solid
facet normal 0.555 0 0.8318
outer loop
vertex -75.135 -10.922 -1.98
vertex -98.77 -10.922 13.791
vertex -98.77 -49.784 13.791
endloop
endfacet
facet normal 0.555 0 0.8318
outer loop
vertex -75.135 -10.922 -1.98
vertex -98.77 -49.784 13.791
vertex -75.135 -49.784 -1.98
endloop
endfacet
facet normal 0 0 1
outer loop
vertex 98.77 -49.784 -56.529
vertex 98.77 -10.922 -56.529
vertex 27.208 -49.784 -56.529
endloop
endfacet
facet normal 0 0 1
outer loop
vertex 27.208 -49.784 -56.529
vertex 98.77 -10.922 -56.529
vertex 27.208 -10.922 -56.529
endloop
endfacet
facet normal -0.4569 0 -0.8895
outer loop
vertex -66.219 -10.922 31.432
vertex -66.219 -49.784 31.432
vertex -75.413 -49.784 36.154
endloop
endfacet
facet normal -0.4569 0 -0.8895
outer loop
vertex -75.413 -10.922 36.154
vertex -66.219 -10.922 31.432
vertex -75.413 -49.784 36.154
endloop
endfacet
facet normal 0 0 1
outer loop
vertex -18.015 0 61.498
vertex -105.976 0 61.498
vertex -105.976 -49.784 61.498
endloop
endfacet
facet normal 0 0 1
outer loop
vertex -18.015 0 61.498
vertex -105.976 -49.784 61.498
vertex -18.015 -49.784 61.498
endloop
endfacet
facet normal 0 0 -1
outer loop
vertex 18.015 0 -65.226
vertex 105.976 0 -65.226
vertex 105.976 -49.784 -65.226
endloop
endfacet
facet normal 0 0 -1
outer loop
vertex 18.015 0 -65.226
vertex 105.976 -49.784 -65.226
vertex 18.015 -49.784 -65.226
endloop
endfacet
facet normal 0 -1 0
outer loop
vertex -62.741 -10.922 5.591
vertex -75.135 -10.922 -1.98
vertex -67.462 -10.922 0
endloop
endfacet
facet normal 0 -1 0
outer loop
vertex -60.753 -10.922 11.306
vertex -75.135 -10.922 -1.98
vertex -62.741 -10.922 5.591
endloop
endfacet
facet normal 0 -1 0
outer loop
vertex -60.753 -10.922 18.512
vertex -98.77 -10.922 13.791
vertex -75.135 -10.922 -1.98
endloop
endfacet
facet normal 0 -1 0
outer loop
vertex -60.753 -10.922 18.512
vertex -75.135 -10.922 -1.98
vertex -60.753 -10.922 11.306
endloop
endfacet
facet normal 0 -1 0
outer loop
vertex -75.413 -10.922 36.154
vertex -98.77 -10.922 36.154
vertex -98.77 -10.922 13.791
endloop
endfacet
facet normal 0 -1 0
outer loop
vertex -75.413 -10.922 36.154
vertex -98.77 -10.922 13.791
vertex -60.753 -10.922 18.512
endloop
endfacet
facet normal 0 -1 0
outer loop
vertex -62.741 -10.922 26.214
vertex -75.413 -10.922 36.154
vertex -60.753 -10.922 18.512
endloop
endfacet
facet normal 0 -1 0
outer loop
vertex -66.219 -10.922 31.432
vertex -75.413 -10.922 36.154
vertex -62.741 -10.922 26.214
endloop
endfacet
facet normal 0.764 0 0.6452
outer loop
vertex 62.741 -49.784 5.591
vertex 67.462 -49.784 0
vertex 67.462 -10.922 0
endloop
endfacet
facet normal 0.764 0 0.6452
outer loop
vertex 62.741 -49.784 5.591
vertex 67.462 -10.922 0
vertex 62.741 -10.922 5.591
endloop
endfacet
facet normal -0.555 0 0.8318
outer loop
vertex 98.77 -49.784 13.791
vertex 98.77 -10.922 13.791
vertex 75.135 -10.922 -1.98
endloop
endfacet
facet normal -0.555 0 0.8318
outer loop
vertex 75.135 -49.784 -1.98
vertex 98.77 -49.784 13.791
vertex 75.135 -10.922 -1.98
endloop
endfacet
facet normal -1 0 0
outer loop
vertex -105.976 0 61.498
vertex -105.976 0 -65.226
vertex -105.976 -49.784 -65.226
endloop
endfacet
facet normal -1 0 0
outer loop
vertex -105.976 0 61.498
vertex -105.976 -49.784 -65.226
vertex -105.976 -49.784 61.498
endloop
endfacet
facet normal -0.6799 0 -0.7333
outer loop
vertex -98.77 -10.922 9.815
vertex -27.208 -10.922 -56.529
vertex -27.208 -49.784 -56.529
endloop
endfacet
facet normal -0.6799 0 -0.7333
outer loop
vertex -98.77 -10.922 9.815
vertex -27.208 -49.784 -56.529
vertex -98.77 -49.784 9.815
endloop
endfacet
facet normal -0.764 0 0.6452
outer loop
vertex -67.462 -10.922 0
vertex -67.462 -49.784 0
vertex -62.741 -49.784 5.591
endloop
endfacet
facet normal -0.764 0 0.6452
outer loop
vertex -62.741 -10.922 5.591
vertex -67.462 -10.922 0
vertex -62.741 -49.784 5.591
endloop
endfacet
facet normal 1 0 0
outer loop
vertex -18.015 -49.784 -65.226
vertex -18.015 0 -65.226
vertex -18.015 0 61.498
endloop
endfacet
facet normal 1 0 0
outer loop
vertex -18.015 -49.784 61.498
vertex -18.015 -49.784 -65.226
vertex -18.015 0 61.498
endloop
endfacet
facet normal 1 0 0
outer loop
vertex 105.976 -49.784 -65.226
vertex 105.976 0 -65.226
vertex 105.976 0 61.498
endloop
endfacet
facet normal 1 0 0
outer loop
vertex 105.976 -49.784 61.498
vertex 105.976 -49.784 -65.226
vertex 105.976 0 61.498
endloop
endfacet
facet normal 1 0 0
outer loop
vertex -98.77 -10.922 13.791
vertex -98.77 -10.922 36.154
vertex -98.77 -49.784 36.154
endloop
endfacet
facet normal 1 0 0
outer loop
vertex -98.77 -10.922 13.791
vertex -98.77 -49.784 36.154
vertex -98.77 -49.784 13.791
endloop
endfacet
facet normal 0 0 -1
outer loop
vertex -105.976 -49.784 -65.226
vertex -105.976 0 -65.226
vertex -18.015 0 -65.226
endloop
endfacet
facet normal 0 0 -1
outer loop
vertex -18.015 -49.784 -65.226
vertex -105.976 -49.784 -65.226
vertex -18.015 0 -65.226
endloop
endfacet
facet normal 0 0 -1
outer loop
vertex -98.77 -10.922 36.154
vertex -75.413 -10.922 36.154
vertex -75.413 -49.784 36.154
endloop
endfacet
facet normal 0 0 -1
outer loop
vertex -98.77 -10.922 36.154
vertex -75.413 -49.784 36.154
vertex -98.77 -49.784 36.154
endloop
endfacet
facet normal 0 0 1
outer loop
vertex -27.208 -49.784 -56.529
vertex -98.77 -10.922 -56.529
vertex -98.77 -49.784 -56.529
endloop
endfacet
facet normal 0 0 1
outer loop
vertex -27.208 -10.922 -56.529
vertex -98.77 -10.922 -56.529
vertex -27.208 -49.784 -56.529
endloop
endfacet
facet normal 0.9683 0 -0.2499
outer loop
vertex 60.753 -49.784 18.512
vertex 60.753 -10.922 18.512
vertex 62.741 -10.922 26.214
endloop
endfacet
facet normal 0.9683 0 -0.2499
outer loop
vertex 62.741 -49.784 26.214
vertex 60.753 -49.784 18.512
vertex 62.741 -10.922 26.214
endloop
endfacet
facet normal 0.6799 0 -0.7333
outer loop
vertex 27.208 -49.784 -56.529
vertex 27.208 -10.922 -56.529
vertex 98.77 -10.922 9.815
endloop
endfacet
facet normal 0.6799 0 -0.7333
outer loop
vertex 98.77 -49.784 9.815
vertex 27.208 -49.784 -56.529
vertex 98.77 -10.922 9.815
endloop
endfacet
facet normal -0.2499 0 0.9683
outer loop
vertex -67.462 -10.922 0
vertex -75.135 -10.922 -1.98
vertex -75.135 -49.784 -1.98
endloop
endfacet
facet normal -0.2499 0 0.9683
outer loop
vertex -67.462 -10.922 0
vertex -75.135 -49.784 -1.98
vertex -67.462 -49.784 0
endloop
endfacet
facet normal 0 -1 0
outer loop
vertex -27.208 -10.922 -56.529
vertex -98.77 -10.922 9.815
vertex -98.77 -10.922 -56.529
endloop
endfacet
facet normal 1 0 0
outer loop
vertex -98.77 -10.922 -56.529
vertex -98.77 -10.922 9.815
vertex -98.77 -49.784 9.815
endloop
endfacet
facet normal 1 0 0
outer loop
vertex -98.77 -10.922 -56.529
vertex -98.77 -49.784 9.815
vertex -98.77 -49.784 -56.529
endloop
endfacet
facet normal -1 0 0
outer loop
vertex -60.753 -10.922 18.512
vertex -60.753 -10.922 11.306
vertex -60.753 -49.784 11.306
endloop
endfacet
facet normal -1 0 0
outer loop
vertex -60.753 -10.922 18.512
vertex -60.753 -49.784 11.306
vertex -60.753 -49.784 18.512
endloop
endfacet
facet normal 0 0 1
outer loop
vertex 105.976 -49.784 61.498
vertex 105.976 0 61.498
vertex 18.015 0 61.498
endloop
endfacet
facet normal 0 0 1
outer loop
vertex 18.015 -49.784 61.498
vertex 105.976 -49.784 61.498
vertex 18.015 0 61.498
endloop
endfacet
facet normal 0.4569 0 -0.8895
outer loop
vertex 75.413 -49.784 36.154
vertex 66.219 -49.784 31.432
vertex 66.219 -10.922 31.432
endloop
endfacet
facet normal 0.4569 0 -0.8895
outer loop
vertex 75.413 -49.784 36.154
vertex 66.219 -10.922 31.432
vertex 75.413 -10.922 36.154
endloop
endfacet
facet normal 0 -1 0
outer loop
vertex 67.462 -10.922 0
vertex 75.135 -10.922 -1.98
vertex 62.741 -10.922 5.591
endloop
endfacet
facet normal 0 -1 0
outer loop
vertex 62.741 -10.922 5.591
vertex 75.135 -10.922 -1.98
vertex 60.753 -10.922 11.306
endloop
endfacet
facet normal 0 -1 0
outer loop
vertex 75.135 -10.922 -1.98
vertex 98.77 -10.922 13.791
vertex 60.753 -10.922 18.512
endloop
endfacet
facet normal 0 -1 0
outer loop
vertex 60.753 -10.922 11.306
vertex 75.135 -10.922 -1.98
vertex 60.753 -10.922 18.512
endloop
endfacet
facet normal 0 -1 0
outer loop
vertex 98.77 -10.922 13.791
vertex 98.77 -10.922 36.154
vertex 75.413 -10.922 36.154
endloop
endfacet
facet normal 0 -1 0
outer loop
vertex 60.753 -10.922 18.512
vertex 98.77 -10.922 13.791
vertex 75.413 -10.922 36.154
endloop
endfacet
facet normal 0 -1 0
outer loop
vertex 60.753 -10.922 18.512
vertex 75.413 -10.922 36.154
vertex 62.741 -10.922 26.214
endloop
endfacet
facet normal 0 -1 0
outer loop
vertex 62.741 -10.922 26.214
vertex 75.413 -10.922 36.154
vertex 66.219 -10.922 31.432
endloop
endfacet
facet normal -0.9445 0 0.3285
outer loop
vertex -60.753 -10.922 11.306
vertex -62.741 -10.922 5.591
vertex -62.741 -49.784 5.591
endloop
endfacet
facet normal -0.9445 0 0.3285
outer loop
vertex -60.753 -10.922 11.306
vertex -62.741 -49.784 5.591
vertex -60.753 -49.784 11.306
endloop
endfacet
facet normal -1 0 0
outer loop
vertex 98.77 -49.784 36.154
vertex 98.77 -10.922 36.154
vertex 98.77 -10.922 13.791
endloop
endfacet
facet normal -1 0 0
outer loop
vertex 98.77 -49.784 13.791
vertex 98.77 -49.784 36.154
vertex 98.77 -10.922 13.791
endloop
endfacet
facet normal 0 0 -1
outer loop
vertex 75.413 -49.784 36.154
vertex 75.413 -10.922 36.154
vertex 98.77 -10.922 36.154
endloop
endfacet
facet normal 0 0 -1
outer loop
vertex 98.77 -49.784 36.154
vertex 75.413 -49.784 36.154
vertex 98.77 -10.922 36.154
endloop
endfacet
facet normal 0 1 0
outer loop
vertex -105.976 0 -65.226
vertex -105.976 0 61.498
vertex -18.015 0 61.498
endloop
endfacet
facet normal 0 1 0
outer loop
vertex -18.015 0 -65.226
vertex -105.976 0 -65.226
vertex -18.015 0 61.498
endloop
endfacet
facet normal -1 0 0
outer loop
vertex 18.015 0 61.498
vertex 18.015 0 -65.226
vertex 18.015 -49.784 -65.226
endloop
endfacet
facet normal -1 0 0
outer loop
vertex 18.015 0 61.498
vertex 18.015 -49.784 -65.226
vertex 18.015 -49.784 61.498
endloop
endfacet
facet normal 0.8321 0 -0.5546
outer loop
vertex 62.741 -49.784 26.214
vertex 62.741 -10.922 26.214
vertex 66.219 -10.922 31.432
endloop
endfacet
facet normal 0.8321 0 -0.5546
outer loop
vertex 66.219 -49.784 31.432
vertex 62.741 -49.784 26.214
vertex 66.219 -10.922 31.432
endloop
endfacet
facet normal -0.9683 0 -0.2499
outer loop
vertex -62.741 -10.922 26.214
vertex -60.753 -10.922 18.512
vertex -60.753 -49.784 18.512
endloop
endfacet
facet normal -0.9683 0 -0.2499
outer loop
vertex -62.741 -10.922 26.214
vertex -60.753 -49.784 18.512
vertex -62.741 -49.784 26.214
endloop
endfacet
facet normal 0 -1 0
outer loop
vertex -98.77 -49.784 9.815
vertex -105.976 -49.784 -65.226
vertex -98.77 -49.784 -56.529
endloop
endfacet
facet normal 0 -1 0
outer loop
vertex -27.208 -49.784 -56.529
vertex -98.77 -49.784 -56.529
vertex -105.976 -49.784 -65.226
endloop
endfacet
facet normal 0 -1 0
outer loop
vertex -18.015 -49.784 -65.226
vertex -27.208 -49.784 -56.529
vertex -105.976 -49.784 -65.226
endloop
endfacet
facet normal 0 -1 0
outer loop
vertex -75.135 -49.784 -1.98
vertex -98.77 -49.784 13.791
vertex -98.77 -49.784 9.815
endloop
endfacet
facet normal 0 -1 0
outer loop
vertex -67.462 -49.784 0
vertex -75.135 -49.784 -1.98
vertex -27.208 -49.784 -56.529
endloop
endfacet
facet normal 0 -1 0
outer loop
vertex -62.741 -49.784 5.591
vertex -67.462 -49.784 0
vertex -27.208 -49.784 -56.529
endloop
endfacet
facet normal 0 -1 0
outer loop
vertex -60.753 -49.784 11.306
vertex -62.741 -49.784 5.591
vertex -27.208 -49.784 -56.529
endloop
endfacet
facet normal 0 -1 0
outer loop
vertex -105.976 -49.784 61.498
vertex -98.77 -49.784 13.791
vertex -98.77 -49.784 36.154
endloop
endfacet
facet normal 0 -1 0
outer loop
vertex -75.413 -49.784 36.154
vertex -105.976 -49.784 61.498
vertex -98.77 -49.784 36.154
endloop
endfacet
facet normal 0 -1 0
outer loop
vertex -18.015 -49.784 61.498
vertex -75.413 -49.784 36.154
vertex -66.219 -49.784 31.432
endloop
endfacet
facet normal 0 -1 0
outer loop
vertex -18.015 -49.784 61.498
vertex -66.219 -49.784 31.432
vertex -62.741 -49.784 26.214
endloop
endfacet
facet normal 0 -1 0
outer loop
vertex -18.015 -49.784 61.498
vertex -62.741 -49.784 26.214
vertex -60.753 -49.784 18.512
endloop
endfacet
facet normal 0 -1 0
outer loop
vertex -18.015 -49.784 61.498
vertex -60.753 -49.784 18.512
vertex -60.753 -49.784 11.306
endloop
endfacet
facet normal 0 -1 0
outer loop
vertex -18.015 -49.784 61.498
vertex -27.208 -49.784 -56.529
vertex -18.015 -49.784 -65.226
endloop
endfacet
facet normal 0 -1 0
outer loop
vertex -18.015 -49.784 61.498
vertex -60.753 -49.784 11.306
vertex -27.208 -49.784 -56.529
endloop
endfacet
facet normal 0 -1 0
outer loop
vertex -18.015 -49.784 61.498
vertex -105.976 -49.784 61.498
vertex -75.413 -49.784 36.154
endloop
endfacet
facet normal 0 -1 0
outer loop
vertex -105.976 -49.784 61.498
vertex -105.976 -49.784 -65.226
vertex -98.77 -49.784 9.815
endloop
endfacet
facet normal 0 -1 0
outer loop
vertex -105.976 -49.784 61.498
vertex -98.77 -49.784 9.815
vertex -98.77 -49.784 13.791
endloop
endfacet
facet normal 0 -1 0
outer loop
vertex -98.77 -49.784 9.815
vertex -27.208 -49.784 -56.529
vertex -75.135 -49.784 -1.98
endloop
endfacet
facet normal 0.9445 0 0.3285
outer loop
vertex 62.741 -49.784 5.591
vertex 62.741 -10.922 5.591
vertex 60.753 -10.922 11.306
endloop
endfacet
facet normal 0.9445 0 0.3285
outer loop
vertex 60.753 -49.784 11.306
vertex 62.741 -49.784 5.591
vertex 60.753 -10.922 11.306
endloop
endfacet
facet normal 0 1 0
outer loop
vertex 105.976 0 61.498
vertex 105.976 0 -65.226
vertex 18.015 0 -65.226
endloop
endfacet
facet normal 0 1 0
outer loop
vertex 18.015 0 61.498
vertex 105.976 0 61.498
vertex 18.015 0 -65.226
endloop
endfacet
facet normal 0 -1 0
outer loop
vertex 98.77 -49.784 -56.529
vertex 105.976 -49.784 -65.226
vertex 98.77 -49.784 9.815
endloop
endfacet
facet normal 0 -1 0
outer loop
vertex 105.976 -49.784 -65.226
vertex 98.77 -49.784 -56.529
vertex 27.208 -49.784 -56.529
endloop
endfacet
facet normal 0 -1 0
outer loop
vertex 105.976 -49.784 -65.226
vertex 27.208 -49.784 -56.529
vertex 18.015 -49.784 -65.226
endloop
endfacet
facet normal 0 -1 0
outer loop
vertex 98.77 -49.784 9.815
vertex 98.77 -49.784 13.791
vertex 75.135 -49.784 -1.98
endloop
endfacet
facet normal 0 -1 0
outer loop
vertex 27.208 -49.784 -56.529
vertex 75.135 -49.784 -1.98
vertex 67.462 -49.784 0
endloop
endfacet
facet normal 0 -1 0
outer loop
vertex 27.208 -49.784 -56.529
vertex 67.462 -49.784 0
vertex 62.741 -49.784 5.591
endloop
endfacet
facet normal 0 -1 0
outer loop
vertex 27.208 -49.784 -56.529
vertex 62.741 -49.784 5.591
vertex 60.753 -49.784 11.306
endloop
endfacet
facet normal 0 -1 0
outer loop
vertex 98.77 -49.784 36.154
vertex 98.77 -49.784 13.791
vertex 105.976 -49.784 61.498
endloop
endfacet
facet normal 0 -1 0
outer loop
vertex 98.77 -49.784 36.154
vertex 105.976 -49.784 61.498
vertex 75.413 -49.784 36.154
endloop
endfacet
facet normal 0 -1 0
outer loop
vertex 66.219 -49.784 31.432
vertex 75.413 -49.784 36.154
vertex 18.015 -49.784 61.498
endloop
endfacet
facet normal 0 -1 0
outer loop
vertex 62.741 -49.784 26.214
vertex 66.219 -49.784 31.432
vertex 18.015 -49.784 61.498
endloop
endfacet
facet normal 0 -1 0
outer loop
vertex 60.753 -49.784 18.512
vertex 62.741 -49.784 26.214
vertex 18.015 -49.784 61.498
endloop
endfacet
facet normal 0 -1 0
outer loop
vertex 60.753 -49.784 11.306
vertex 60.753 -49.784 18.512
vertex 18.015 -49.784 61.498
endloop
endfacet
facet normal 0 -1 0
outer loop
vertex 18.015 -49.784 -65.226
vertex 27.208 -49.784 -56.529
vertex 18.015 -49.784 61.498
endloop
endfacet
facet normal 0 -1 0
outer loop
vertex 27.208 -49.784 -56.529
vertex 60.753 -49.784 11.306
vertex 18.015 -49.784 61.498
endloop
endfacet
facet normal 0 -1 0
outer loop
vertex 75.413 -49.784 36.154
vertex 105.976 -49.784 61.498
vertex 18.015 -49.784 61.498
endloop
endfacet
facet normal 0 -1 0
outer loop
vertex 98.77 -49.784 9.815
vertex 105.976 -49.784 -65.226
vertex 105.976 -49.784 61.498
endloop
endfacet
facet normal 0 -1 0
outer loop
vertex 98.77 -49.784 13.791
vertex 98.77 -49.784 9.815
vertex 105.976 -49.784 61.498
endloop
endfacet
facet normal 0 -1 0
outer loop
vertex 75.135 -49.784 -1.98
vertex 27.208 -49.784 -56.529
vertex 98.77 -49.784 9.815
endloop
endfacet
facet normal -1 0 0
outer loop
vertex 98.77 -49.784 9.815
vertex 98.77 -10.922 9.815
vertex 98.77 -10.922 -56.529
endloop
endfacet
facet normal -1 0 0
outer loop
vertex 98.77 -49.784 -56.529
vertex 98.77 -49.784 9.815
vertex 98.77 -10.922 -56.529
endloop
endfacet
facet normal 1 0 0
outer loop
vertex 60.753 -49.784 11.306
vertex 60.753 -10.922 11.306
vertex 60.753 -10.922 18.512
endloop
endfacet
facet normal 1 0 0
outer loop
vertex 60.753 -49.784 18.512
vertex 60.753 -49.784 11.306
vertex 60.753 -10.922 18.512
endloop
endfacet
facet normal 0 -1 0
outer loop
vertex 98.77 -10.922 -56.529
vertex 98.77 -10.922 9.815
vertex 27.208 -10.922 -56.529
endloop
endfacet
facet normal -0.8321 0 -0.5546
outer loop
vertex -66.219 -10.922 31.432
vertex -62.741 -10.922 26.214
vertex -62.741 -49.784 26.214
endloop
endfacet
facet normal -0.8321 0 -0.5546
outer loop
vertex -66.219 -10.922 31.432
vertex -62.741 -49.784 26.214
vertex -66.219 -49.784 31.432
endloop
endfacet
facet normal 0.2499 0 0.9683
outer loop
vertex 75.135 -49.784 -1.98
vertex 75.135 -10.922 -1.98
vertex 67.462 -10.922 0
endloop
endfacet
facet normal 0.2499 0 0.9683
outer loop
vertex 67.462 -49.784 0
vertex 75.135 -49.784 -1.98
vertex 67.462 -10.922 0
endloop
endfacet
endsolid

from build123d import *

# Parameters (mm, degrees)
F0_W     = 87.9613030702
F0_H     = 126.7239116132
F1_DEPTH = 49.784
F3_START = 10.922
F3_DEPTH = 59.69


with BuildPart() as f1:
    # F0 (on Front) → F1 (new body)
    with BuildSketch(Plane.XZ):
        with Locations((-61.9953265414, -1.863585785)):
            Rectangle(F0_W, F0_H)
    extrude(amount=F1_DEPTH)

    # F2 (on Front) → F3 (cut)
    with BuildSketch(Plane.XZ.offset(F3_START)):
        Polygon((-27.2083692253, -56.5288066864), (-98.7701117992, 9.8148910329), (-98.7701117992, -56.5288066864), align=None)
        Polygon((-98.7701117992, 36.153588444), (-98.7701117992, 13.7905431911), (-75.1346149577, -1.9800721771), (-67.461848259, 0), (-62.740765512, 5.5907610804), (-60.7529357076, 11.3057605922), (-60.7529357076, 18.5116305947), (-62.740765512, 26.2144580483), (-66.2194564939, 31.4324982464), (-75.4131525755, 36.153588444), align=None)
    extrude(amount=F3_DEPTH, mode=Mode.SUBTRACT)


with BuildPart() as f4_1:
    # F4: instance of F1
    add(f1.part.mirror(Plane.YZ))


solid = Compound([f1.part, f4_1.part])
